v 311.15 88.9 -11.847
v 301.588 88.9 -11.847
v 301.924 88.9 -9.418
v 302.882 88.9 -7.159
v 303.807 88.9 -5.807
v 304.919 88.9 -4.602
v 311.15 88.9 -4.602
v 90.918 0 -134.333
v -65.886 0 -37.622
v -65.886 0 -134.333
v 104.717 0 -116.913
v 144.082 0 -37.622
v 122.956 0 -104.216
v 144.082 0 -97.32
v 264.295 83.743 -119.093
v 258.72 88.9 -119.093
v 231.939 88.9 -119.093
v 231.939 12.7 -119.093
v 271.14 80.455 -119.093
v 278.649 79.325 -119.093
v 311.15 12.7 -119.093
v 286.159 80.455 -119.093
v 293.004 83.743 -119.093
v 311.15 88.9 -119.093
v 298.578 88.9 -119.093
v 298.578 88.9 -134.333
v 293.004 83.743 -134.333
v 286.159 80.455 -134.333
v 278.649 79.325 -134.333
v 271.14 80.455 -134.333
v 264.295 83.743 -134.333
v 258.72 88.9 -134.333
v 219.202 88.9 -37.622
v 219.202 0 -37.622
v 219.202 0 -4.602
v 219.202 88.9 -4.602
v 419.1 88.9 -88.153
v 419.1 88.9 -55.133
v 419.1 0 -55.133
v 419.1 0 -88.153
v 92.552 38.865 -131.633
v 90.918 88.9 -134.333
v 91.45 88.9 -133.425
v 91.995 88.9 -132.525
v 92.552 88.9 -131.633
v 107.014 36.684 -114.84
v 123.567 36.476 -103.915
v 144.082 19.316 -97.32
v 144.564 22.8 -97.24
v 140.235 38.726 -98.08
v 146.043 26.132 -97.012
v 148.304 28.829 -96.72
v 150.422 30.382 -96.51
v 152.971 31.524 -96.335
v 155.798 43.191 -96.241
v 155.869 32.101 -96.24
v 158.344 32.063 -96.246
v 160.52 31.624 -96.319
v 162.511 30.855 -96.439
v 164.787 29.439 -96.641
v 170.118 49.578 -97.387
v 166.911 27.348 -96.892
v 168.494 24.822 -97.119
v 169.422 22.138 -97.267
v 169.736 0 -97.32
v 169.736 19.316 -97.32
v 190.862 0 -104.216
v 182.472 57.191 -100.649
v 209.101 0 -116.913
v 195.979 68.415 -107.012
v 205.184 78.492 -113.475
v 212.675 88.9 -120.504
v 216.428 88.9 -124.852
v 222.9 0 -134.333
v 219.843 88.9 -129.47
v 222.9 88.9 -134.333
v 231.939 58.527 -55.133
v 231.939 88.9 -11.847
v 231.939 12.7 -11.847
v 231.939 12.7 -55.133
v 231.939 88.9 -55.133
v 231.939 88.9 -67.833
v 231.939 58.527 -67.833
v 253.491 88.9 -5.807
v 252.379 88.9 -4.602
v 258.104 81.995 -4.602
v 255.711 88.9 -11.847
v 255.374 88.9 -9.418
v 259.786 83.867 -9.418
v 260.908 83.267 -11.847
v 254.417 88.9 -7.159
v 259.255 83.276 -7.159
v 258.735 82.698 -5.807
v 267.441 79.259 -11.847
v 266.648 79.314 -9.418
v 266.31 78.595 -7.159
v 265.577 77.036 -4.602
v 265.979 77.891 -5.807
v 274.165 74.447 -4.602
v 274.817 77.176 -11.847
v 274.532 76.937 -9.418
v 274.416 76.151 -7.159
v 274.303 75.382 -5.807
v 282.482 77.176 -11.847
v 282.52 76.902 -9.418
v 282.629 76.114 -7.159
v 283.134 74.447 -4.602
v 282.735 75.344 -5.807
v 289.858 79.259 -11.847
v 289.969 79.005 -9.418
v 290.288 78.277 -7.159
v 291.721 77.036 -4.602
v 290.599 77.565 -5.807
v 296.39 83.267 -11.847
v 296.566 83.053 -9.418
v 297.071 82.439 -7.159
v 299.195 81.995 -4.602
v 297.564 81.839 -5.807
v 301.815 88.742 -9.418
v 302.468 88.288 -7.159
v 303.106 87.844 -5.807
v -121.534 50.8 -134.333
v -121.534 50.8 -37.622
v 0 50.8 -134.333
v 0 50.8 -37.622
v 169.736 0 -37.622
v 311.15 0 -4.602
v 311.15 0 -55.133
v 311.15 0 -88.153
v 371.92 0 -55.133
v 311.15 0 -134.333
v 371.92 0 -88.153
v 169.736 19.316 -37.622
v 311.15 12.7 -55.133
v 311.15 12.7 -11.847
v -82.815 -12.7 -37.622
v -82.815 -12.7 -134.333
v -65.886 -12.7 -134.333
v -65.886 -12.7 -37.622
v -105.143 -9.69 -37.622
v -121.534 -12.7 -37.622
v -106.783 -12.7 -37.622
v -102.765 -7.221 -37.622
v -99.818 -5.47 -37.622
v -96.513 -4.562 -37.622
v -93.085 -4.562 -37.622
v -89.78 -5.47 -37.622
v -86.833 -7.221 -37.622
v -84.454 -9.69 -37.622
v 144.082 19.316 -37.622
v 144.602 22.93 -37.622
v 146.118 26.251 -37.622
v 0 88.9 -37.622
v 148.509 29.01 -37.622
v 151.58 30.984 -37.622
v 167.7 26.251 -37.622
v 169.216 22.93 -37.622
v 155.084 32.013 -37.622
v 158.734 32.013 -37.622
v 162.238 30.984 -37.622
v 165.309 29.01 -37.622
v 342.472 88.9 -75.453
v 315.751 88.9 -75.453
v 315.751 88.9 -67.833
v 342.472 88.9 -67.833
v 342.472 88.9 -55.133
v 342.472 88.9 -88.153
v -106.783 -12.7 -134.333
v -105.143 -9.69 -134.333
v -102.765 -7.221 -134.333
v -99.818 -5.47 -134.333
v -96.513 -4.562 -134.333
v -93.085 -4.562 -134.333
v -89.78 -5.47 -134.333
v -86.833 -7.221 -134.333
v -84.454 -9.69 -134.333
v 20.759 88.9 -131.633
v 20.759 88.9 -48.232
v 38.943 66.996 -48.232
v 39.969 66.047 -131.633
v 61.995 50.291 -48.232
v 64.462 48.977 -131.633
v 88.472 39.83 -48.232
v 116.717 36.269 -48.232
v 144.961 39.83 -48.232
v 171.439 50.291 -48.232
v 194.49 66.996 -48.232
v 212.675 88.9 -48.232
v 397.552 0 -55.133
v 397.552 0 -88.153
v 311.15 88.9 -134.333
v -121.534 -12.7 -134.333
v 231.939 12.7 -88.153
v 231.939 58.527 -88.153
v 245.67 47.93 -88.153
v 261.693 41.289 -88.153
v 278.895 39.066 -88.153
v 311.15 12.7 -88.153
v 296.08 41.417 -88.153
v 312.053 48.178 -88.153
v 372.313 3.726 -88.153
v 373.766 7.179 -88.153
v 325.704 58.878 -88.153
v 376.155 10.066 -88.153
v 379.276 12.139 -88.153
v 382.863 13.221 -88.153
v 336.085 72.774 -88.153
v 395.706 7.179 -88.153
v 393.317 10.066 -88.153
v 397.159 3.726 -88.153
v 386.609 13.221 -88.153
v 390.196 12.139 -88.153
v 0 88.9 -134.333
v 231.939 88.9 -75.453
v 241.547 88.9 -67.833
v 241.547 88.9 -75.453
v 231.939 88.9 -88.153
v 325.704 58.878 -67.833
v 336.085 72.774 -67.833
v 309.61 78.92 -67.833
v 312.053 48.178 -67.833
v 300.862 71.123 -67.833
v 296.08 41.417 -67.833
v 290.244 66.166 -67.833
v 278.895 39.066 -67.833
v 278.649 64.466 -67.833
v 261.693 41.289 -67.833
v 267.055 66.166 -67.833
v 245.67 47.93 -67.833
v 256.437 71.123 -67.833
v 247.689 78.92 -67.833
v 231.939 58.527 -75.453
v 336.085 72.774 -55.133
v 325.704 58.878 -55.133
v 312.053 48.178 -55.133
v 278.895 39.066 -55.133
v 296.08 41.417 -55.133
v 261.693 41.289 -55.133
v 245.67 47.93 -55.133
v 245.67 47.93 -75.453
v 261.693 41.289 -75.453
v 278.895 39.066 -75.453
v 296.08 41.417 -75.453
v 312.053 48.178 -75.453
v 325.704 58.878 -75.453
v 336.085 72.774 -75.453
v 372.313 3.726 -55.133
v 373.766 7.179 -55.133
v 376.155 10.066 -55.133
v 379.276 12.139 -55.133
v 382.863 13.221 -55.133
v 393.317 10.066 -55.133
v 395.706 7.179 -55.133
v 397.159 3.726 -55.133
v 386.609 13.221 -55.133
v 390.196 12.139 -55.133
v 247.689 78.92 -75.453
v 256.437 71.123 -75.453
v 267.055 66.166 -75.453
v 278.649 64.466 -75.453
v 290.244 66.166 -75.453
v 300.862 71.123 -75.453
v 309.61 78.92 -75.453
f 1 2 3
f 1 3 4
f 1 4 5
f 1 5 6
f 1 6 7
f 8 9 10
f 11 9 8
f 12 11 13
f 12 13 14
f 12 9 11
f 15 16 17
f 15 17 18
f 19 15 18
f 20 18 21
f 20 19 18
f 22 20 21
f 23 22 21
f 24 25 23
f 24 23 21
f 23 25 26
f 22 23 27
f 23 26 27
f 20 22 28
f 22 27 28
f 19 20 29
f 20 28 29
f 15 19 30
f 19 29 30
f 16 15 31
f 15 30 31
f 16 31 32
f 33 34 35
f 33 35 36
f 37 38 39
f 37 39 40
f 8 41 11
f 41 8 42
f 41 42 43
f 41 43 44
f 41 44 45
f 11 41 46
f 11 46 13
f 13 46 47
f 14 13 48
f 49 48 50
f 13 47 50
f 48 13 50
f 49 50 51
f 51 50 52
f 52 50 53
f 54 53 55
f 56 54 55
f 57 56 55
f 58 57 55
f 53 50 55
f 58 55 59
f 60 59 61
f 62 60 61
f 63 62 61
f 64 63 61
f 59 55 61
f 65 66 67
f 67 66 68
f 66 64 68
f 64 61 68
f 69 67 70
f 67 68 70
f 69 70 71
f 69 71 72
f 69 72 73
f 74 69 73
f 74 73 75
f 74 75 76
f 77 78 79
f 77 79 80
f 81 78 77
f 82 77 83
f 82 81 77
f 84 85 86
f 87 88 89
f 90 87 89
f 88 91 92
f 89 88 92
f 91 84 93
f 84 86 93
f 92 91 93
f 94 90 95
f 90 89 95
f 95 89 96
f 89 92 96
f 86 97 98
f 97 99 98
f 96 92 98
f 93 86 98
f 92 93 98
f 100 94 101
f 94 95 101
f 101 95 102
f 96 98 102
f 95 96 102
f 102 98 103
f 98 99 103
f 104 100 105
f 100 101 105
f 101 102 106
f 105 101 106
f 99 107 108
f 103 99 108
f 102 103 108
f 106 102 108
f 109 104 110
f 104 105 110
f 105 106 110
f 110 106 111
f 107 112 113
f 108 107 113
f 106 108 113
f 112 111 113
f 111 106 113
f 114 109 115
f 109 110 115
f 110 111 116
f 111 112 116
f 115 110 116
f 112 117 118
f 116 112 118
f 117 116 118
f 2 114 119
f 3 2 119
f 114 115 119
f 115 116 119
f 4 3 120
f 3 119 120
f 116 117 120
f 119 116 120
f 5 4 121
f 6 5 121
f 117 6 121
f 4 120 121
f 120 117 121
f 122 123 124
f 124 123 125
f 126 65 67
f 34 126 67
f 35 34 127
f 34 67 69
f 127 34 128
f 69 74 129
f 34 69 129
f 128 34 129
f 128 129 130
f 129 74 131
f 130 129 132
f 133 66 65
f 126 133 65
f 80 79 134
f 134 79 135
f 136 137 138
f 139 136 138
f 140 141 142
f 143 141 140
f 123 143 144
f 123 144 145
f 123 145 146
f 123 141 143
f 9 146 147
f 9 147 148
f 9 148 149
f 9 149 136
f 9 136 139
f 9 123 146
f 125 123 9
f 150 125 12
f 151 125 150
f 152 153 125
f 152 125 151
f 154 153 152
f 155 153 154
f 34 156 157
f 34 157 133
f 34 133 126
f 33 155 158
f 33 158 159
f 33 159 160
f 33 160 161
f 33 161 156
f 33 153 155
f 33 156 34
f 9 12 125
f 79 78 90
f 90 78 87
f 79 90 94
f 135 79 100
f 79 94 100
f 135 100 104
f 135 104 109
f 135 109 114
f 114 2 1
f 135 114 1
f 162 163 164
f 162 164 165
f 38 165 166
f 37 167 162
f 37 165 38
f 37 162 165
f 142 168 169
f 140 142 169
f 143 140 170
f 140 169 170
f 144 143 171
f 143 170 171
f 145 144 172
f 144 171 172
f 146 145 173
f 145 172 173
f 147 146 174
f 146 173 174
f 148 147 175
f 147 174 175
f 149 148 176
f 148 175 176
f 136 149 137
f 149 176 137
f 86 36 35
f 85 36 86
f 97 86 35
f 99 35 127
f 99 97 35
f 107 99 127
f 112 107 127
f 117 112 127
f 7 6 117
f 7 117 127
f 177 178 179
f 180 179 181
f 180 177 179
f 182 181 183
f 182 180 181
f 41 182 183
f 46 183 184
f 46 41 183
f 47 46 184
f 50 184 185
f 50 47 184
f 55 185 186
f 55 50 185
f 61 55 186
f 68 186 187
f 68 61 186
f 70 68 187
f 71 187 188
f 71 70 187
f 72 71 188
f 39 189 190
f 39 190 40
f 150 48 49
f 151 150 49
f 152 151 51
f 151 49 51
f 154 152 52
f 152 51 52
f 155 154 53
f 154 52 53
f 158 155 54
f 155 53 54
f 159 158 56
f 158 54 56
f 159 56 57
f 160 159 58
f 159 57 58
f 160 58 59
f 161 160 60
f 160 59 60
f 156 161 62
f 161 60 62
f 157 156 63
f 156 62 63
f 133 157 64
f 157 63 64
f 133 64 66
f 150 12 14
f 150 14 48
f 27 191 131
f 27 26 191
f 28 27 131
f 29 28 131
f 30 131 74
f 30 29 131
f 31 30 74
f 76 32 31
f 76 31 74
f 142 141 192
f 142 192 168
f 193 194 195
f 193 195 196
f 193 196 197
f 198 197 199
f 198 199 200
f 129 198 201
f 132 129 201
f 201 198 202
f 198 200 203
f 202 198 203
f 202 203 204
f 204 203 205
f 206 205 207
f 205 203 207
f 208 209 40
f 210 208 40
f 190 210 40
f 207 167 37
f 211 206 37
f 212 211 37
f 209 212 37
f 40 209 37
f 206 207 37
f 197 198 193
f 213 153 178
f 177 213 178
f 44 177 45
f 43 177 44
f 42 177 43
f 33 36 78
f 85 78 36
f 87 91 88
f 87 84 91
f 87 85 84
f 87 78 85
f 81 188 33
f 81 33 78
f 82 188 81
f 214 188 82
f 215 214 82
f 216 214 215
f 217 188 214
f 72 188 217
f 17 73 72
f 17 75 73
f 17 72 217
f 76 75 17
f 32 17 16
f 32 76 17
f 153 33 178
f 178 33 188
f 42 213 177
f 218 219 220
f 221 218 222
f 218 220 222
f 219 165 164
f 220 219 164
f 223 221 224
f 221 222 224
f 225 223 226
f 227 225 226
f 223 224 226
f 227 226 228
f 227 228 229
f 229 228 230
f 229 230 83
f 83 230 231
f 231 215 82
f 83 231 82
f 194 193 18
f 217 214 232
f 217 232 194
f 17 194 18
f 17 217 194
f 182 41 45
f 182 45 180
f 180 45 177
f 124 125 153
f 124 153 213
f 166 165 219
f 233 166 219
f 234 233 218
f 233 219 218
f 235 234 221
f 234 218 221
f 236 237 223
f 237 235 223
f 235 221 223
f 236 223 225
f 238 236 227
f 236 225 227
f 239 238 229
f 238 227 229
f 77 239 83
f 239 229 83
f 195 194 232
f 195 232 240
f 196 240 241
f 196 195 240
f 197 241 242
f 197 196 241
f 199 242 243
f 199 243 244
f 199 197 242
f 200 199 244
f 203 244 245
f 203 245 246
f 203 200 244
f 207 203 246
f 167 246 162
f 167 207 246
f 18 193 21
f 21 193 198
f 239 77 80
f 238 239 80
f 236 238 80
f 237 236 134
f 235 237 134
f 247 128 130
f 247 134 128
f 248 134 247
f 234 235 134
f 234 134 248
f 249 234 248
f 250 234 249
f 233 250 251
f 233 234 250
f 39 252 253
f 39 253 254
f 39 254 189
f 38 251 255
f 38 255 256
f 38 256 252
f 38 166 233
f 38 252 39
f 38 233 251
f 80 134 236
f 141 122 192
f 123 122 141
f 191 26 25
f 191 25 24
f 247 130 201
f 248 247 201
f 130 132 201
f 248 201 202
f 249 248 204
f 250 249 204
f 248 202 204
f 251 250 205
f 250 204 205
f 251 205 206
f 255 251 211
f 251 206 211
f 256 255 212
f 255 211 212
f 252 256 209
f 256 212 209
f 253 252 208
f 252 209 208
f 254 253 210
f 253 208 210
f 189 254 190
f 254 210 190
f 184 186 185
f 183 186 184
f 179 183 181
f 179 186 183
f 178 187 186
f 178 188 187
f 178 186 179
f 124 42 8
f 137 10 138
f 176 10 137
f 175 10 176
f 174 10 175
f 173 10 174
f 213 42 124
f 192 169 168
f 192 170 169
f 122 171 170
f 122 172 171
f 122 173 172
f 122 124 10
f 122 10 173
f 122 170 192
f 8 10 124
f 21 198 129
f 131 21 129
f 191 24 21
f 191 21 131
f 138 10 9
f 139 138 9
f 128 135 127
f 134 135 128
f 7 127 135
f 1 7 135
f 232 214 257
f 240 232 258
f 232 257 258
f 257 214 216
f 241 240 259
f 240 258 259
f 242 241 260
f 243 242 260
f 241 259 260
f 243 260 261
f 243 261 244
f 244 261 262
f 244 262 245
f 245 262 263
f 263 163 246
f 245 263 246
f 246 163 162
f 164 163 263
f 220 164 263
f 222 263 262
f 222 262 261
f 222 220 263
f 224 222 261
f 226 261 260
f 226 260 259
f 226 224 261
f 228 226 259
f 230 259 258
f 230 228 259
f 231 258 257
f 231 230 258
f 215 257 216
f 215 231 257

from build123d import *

# Parameters (mm, degrees)
SKETCH1_W           = 419.1
SKETCH1_H           = 142.18412
BOSS_EXTRUDE1_DEPTH = 88.9
SKETCH2_R           = 119.38
CUT_EXTRUDE1_DEPTH  = 83.4009
SKETCH7_W           = 187.160719179
SKETCH7_H           = 30.93974
SKETCH7_H_2         = 43.28668
CUT_EXTRUDE2_DEPTH  = 452.402640644
SKETCH4_R           = 40.386
CUT_EXTRUDE4_DEPTH  = 7.62
CUT_EXTRUDE17_START = -12.7
CUT_EXTRUDE17_DEPTH = 12.7
CUT_EXTRUDE18_DEPTH = 12.7
SKETCH18_R          = 25.527
CUT_EXTRUDE11_DEPTH = 23.09114
SKETCH8_W           = 419.1
SKETCH8_H           = 88.9
CUT_EXTRUDE6_DEPTH  = 7.85114
SKETCH9_W           = 419.1
SKETCH9_H           = 88.9
CUT_EXTRUDE7_DEPTH  = 7.14248
SKETCH10_W          = 219.202
SKETCH10_H          = 88.9
CUT_EXTRUDE8_DEPTH  = 30.48
SKETCH12_W          = 121.533574186
SKETCH12_H          = 96.7105
BOSS_EXTRUDE2_DEPTH = 50.8
SKETCH14_W          = 55.647095764
SKETCH14_H          = 96.7105
BOSS_EXTRUDE3_DEPTH = 12.7
CUT_EXTRUDE10_REACH = 448.907
SKETCH17_R          = 12.827
SKETCH22_W          = 199.898
SKETCH22_H          = 88.9
BOSS_EXTRUDE5_DEPTH = 2.54
SKETCH29_R          = 12.827
CUT_EXTRUDE14_DEPTH = 447.906526346
BOSS_EXTRUDE6_DEPTH = 86.10092
SKETCH45_W          = 107.95
SKETCH45_H          = 50.53076
SKETCH45_H_2        = 15.24
CUT_EXTRUDE22_DEPTH = 452.677672269
SKETCH46_W          = 91.948
SKETCH46_H          = 129.7305
BOSS_EXTRUDE7_DEPTH = 12.7
CUT_EXTRUDE23_DEPTH = 452.677672176


with BuildPart() as part:
    # Sketch1 → Boss-Extrude1 (new body)
    with BuildSketch(Plane(origin=(0, 0, 0), x_dir=(1, 0, 0), z_dir=(0, 1, 0))):
        with Locations((209.55, 71.09206)):
            Rectangle(SKETCH1_W, SKETCH1_H)
    extrude(amount=BOSS_EXTRUDE1_DEPTH)

    # Sketch2 → Cut-Extrude1 (cut)
    with BuildSketch(Plane(origin=(0, 0, -131.63296), x_dir=(-1, 0, 0), z_dir=(0, 0, -1))):
        with Locations((-116.7166499, 150.061217688)):
            Circle(SKETCH2_R)
    extrude(amount=-CUT_EXTRUDE1_DEPTH, mode=Mode.SUBTRACT)

    # Sketch7 → Cut-Extrude2 (cut, through all)
    with BuildSketch(Plane(origin=(0, 88.9, 0), x_dir=(1, 0, 0), z_dir=(0, 1, 0))):
        with Locations((325.519640411, 103.62311)):
            Rectangle(SKETCH7_W, SKETCH7_H)
        with Locations((325.519640411, 33.4899)):
            Rectangle(SKETCH7_W, SKETCH7_H_2)
    extrude(amount=-CUT_EXTRUDE2_DEPTH, mode=Mode.SUBTRACT)

    # Sketch4 → Cut-Extrude4 (cut)
    with BuildSketch(Plane(origin=(0, 0, -67.83324), x_dir=(-1, 0, 0), z_dir=(0, 0, -1))):
        with Locations((-278.649352085, 104.852009966)):
            Circle(SKETCH4_R)
    extrude(amount=CUT_EXTRUDE4_DEPTH, mode=Mode.SUBTRACT)

    # Sketch39 → Cut-Extrude17 (cut)
    with BuildSketch(Plane.XY.offset(-55.13324).offset(CUT_EXTRUDE17_START)):
        with BuildLine():
            Line((231.939280821, 58.527426444), (231.939280821, 88.9))
            Line((231.939280821, 88.9), (342.472006166, 88.9))
            ThreePointArc((342.472006166, 88.9), (296.080170447, 41.417284719), (231.939280821, 58.527426444))
        make_face()
    extrude(amount=CUT_EXTRUDE17_DEPTH, mode=Mode.SUBTRACT)

    # Sketch40 → Cut-Extrude18 (cut)
    with BuildSketch(Plane(origin=(0, 0, -88.15324), x_dir=(-1, 0, 0), z_dir=(0, 0, -1))):
        with BuildLine():
            Line((-231.939280821, 88.9), (-231.939280821, 58.527426444))
            ThreePointArc((-231.939280821, 58.527426444), (-296.080170447, 41.417284719), (-342.472006166, 88.9))
            Line((-342.472006166, 88.9), (-231.939280821, 88.9))
        make_face()
    extrude(amount=-CUT_EXTRUDE18_DEPTH, mode=Mode.SUBTRACT)

    # Sketch18 → Cut-Extrude11 (cut)
    with BuildSketch(Plane(origin=(0, 0, -142.18412), x_dir=(-1, 0, 0), z_dir=(0, 0, -1))):
        with Locations((-278.649352085, 104.852009966)):
            Circle(SKETCH18_R)
    extrude(amount=-CUT_EXTRUDE11_DEPTH, mode=Mode.SUBTRACT)

    # Sketch8 → Cut-Extrude6 (cut)
    with BuildSketch(Plane(origin=(0, 0, -142.18412), x_dir=(-1, 0, 0), z_dir=(0, 0, -1))):
        with Locations((-209.55, 44.45)):
            Rectangle(SKETCH8_W, SKETCH8_H)
    extrude(amount=-CUT_EXTRUDE6_DEPTH, mode=Mode.SUBTRACT)

    # Sketch9 → Cut-Extrude7 (cut)
    with BuildSketch(Plane.XY):
        with Locations((209.55, 44.45)):
            Rectangle(SKETCH9_W, SKETCH9_H)
    extrude(amount=-CUT_EXTRUDE7_DEPTH, mode=Mode.SUBTRACT)

    # Sketch10 → Cut-Extrude8 (cut)
    with BuildSketch(Plane.XY.offset(-7.14248)):
        with Locations((109.601, 44.45)):
            Rectangle(SKETCH10_W, SKETCH10_H)
    extrude(amount=-CUT_EXTRUDE8_DEPTH, mode=Mode.SUBTRACT)

    # Sketch12 → Boss-Extrude2 (add)
    with BuildSketch(Plane.XZ):
        with Locations((-60.766787093, -85.97773)):
            Rectangle(SKETCH12_W, SKETCH12_H)
    extrude(amount=-BOSS_EXTRUDE2_DEPTH)

    # Sketch14 → Boss-Extrude3 (add)
    with BuildSketch(Plane.XZ):
        with Locations((-93.710026304, -85.97773)):
            Rectangle(SKETCH14_W, SKETCH14_H)
    extrude(amount=BOSS_EXTRUDE3_DEPTH)

    # Cut-Extrude10: up to this face of the body (flat: up to its plane)
    cut_extrude10_end = Plane(part.part.faces().sort_by_distance((319.151, 44.45, -7.14248))[0])
    # Sketch17 → Cut-Extrude10 (cut, up to the picked face)
    with BuildSketch(Plane(origin=(0, 0, -134.33298), x_dir=(-1, 0, 0), z_dir=(0, 0, -1)), mode=Mode.PRIVATE) as cut_extrude10_sk1:
        with Locations((-384.735935495, 0.531880938)):
            Circle(SKETCH17_R)
    cut_extrude10_tool1 = split(extrude(cut_extrude10_sk1.sketch, amount=-CUT_EXTRUDE10_REACH, mode=Mode.PRIVATE), bisect_by=cut_extrude10_end, keep=Keep.BOTH, mode=Mode.PRIVATE)
    # Sketch17 → Cut-Extrude10 (cut, up to the picked face)
    with BuildSketch(Plane(origin=(0, 0, -134.33298), x_dir=(-1, 0, 0), z_dir=(0, 0, -1)), mode=Mode.PRIVATE) as cut_extrude10_sk2:
        with Locations((94.798916194, -17.274045482)):
            Circle(SKETCH17_R)
    cut_extrude10_tool2 = split(extrude(cut_extrude10_sk2.sketch, amount=-CUT_EXTRUDE10_REACH, mode=Mode.PRIVATE), bisect_by=cut_extrude10_end, keep=Keep.BOTH, mode=Mode.PRIVATE)
    # Sketch17 → Cut-Extrude10 (cut, up to the picked face)
    with BuildSketch(Plane(origin=(0, 0, -134.33298), x_dir=(-1, 0, 0), z_dir=(0, 0, -1)), mode=Mode.PRIVATE) as cut_extrude10_sk3:
        with BuildLine():
            Line((-169.736021607, 19.31637742), (-169.736021607, 0))
            Line((-169.736021607, 0), (-144.082021607, 0))
            Line((-144.082021607, 0), (-144.082021607, 19.31637742))
            ThreePointArc((-144.082021607, 19.31637742), (-156.909021607, 32.14337742), (-169.736021607, 19.31637742))
        make_face()
    cut_extrude10_tool3 = split(extrude(cut_extrude10_sk3.sketch, amount=-CUT_EXTRUDE10_REACH, mode=Mode.PRIVATE), bisect_by=cut_extrude10_end, keep=Keep.BOTH, mode=Mode.PRIVATE)
    add(cut_extrude10_tool1.solids().sort_by(Axis((384.735935, 0.531881, -134.33298), (0, 0, 1)))[0], mode=Mode.SUBTRACT)
    add(cut_extrude10_tool2.solids().sort_by(Axis((-94.798916, -17.274045, -134.33298), (0, 0, 1)))[0], mode=Mode.SUBTRACT)
    add(cut_extrude10_tool3.solids().sort_by(Axis((156.909022, 14.834778, -134.33298), (0, 0, 1)))[0], mode=Mode.SUBTRACT)

    # Sketch22 → Boss-Extrude5 (add)
    with BuildSketch(Plane.XY.offset(-7.14248)):
        with Locations((319.151, 44.45)):
            Rectangle(SKETCH22_W, SKETCH22_H)
    extrude(amount=BOSS_EXTRUDE5_DEPTH)

    # Sketch29 → Cut-Extrude14 (cut, through all)
    with BuildSketch(Plane(origin=(0, 0, -7.14248), x_dir=(-1, 0, 0), z_dir=(0, 0, -1))):
        with Locations((-384.735935495, 0.531880938)):
            Circle(SKETCH29_R)
    extrude(amount=-CUT_EXTRUDE14_DEPTH, mode=Mode.SUBTRACT)

    # Sketch30 → Boss-Extrude6 (add)
    with BuildSketch(Plane(origin=(0, 0, -134.33298), x_dir=(-1, 0, 0), z_dir=(0, 0, -1))):
        with BuildLine():
            Line((-14.194018979, 88.9), (-20.758717893, 88.9))
            ThreePointArc((-20.758717893, 88.9), (-116.7166499, 36.269217688), (-212.674581906, 88.9))
            Line((-212.674581906, 88.9), (-219.239280821, 88.9))
            ThreePointArc((-219.239280821, 88.9), (-116.7166499, 30.681217688), (-14.194018979, 88.9))
        make_face()
    extrude(amount=-BOSS_EXTRUDE6_DEPTH)

    # Sketch44 → Cut-Revolve1 (revolve, cut)
    with BuildSketch(Plane(origin=(0, 104.852009966, 0), x_dir=(1, 0, 0), z_dir=(0, 1, 0))):
        with BuildLine():
            Line((278.649352085, 11.84656), (306.589352085, 11.84656))
            ThreePointArc((306.589352085, 11.84656), (307.31205993, 7.964449393), (309.383352085, 4.60248))
            Line((309.383352085, 4.60248), (278.649352085, 4.60248))
            Line((278.649352085, 4.60248), (278.649352085, 11.84656))
        make_face()
    revolve(axis=Axis((278.649352085, 104.852009966, -328.456473898), (0, 0, 1)), mode=Mode.SUBTRACT)

    # Sketch45 → Cut-Extrude22 (cut, through all)
    with BuildSketch(Plane(origin=(0, 88.9, 0), x_dir=(1, 0, 0), z_dir=(0, 1, 0))):
        with Locations((365.125, 29.86786)):
            Rectangle(SKETCH45_W, SKETCH45_H)
        with Locations((365.125, 126.71298)):
            Rectangle(SKETCH45_W, SKETCH45_H_2)
    extrude(amount=-CUT_EXTRUDE22_DEPTH, mode=Mode.SUBTRACT)

    # Sketch46 → Boss-Extrude7 (add)
    with BuildSketch(Plane.XZ):
        with Locations((265.176, -69.46773)):
            Rectangle(SKETCH46_W, SKETCH46_H)
    extrude(amount=-BOSS_EXTRUDE7_DEPTH)

    # Sketch47 → Cut-Extrude23 (cut, through all)
    with BuildSketch(Plane(origin=(0, 88.9, 0), x_dir=(1, 0, 0), z_dir=(0, 1, 0))):
        with BuildLine():
            Line((222.900157375, 134.33298), (90.917885838, 134.33298))
            ThreePointArc((90.917885838, 134.33298), (156.909021607, 96.23298), (222.900157375, 134.33298))
        make_face()
    extrude(amount=-CUT_EXTRUDE23_DEPTH, mode=Mode.SUBTRACT)


solid = part.part
